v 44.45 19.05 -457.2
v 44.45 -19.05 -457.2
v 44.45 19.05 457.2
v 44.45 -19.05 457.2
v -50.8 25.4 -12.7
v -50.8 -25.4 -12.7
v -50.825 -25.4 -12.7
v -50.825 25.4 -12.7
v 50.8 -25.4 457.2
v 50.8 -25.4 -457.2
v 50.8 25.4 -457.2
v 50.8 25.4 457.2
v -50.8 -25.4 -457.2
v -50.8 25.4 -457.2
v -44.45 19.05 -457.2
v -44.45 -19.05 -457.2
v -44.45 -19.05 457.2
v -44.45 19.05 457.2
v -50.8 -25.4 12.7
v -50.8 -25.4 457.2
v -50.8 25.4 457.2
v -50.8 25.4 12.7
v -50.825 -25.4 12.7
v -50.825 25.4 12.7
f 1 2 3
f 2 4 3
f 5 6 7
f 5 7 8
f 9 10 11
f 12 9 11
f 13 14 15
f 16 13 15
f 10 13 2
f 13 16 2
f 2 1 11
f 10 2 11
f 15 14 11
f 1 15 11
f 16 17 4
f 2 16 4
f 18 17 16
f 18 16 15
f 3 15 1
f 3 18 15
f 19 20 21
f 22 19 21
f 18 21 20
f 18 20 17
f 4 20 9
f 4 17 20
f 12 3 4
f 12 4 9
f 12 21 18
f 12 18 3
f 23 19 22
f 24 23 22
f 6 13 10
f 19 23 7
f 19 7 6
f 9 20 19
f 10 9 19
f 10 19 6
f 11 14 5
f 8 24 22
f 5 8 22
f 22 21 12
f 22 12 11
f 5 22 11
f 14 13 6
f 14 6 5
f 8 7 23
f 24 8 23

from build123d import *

# Parameters (mm, degrees)
SKETCH1_W           = 101.6
SKETCH1_H           = 50.8
SKETCH1_W_2         = 88.9
SKETCH1_H_2         = 38.1
BOSS_EXTRUDE1_DEPTH = 457.2
SKETCH4_W           = 25.4
SKETCH4_H           = 50.8
BOSS_EXTRUDE3_DEPTH = 0.0254


with BuildPart() as part:
    # Sketch1 → Boss-Extrude1 (new body, symmetric)
    with BuildSketch(Plane.XY):
        Rectangle(SKETCH1_W, SKETCH1_H)
        Rectangle(SKETCH1_W_2, SKETCH1_H_2, mode=Mode.SUBTRACT)
    extrude(amount=BOSS_EXTRUDE1_DEPTH, both=True)

    # Sketch4 → Boss-Extrude3 (add)
    with BuildSketch(Plane.ZY.offset(50.8)):
        Rectangle(SKETCH4_W, SKETCH4_H)
    extrude(amount=BOSS_EXTRUDE3_DEPTH)


solid = part.part
